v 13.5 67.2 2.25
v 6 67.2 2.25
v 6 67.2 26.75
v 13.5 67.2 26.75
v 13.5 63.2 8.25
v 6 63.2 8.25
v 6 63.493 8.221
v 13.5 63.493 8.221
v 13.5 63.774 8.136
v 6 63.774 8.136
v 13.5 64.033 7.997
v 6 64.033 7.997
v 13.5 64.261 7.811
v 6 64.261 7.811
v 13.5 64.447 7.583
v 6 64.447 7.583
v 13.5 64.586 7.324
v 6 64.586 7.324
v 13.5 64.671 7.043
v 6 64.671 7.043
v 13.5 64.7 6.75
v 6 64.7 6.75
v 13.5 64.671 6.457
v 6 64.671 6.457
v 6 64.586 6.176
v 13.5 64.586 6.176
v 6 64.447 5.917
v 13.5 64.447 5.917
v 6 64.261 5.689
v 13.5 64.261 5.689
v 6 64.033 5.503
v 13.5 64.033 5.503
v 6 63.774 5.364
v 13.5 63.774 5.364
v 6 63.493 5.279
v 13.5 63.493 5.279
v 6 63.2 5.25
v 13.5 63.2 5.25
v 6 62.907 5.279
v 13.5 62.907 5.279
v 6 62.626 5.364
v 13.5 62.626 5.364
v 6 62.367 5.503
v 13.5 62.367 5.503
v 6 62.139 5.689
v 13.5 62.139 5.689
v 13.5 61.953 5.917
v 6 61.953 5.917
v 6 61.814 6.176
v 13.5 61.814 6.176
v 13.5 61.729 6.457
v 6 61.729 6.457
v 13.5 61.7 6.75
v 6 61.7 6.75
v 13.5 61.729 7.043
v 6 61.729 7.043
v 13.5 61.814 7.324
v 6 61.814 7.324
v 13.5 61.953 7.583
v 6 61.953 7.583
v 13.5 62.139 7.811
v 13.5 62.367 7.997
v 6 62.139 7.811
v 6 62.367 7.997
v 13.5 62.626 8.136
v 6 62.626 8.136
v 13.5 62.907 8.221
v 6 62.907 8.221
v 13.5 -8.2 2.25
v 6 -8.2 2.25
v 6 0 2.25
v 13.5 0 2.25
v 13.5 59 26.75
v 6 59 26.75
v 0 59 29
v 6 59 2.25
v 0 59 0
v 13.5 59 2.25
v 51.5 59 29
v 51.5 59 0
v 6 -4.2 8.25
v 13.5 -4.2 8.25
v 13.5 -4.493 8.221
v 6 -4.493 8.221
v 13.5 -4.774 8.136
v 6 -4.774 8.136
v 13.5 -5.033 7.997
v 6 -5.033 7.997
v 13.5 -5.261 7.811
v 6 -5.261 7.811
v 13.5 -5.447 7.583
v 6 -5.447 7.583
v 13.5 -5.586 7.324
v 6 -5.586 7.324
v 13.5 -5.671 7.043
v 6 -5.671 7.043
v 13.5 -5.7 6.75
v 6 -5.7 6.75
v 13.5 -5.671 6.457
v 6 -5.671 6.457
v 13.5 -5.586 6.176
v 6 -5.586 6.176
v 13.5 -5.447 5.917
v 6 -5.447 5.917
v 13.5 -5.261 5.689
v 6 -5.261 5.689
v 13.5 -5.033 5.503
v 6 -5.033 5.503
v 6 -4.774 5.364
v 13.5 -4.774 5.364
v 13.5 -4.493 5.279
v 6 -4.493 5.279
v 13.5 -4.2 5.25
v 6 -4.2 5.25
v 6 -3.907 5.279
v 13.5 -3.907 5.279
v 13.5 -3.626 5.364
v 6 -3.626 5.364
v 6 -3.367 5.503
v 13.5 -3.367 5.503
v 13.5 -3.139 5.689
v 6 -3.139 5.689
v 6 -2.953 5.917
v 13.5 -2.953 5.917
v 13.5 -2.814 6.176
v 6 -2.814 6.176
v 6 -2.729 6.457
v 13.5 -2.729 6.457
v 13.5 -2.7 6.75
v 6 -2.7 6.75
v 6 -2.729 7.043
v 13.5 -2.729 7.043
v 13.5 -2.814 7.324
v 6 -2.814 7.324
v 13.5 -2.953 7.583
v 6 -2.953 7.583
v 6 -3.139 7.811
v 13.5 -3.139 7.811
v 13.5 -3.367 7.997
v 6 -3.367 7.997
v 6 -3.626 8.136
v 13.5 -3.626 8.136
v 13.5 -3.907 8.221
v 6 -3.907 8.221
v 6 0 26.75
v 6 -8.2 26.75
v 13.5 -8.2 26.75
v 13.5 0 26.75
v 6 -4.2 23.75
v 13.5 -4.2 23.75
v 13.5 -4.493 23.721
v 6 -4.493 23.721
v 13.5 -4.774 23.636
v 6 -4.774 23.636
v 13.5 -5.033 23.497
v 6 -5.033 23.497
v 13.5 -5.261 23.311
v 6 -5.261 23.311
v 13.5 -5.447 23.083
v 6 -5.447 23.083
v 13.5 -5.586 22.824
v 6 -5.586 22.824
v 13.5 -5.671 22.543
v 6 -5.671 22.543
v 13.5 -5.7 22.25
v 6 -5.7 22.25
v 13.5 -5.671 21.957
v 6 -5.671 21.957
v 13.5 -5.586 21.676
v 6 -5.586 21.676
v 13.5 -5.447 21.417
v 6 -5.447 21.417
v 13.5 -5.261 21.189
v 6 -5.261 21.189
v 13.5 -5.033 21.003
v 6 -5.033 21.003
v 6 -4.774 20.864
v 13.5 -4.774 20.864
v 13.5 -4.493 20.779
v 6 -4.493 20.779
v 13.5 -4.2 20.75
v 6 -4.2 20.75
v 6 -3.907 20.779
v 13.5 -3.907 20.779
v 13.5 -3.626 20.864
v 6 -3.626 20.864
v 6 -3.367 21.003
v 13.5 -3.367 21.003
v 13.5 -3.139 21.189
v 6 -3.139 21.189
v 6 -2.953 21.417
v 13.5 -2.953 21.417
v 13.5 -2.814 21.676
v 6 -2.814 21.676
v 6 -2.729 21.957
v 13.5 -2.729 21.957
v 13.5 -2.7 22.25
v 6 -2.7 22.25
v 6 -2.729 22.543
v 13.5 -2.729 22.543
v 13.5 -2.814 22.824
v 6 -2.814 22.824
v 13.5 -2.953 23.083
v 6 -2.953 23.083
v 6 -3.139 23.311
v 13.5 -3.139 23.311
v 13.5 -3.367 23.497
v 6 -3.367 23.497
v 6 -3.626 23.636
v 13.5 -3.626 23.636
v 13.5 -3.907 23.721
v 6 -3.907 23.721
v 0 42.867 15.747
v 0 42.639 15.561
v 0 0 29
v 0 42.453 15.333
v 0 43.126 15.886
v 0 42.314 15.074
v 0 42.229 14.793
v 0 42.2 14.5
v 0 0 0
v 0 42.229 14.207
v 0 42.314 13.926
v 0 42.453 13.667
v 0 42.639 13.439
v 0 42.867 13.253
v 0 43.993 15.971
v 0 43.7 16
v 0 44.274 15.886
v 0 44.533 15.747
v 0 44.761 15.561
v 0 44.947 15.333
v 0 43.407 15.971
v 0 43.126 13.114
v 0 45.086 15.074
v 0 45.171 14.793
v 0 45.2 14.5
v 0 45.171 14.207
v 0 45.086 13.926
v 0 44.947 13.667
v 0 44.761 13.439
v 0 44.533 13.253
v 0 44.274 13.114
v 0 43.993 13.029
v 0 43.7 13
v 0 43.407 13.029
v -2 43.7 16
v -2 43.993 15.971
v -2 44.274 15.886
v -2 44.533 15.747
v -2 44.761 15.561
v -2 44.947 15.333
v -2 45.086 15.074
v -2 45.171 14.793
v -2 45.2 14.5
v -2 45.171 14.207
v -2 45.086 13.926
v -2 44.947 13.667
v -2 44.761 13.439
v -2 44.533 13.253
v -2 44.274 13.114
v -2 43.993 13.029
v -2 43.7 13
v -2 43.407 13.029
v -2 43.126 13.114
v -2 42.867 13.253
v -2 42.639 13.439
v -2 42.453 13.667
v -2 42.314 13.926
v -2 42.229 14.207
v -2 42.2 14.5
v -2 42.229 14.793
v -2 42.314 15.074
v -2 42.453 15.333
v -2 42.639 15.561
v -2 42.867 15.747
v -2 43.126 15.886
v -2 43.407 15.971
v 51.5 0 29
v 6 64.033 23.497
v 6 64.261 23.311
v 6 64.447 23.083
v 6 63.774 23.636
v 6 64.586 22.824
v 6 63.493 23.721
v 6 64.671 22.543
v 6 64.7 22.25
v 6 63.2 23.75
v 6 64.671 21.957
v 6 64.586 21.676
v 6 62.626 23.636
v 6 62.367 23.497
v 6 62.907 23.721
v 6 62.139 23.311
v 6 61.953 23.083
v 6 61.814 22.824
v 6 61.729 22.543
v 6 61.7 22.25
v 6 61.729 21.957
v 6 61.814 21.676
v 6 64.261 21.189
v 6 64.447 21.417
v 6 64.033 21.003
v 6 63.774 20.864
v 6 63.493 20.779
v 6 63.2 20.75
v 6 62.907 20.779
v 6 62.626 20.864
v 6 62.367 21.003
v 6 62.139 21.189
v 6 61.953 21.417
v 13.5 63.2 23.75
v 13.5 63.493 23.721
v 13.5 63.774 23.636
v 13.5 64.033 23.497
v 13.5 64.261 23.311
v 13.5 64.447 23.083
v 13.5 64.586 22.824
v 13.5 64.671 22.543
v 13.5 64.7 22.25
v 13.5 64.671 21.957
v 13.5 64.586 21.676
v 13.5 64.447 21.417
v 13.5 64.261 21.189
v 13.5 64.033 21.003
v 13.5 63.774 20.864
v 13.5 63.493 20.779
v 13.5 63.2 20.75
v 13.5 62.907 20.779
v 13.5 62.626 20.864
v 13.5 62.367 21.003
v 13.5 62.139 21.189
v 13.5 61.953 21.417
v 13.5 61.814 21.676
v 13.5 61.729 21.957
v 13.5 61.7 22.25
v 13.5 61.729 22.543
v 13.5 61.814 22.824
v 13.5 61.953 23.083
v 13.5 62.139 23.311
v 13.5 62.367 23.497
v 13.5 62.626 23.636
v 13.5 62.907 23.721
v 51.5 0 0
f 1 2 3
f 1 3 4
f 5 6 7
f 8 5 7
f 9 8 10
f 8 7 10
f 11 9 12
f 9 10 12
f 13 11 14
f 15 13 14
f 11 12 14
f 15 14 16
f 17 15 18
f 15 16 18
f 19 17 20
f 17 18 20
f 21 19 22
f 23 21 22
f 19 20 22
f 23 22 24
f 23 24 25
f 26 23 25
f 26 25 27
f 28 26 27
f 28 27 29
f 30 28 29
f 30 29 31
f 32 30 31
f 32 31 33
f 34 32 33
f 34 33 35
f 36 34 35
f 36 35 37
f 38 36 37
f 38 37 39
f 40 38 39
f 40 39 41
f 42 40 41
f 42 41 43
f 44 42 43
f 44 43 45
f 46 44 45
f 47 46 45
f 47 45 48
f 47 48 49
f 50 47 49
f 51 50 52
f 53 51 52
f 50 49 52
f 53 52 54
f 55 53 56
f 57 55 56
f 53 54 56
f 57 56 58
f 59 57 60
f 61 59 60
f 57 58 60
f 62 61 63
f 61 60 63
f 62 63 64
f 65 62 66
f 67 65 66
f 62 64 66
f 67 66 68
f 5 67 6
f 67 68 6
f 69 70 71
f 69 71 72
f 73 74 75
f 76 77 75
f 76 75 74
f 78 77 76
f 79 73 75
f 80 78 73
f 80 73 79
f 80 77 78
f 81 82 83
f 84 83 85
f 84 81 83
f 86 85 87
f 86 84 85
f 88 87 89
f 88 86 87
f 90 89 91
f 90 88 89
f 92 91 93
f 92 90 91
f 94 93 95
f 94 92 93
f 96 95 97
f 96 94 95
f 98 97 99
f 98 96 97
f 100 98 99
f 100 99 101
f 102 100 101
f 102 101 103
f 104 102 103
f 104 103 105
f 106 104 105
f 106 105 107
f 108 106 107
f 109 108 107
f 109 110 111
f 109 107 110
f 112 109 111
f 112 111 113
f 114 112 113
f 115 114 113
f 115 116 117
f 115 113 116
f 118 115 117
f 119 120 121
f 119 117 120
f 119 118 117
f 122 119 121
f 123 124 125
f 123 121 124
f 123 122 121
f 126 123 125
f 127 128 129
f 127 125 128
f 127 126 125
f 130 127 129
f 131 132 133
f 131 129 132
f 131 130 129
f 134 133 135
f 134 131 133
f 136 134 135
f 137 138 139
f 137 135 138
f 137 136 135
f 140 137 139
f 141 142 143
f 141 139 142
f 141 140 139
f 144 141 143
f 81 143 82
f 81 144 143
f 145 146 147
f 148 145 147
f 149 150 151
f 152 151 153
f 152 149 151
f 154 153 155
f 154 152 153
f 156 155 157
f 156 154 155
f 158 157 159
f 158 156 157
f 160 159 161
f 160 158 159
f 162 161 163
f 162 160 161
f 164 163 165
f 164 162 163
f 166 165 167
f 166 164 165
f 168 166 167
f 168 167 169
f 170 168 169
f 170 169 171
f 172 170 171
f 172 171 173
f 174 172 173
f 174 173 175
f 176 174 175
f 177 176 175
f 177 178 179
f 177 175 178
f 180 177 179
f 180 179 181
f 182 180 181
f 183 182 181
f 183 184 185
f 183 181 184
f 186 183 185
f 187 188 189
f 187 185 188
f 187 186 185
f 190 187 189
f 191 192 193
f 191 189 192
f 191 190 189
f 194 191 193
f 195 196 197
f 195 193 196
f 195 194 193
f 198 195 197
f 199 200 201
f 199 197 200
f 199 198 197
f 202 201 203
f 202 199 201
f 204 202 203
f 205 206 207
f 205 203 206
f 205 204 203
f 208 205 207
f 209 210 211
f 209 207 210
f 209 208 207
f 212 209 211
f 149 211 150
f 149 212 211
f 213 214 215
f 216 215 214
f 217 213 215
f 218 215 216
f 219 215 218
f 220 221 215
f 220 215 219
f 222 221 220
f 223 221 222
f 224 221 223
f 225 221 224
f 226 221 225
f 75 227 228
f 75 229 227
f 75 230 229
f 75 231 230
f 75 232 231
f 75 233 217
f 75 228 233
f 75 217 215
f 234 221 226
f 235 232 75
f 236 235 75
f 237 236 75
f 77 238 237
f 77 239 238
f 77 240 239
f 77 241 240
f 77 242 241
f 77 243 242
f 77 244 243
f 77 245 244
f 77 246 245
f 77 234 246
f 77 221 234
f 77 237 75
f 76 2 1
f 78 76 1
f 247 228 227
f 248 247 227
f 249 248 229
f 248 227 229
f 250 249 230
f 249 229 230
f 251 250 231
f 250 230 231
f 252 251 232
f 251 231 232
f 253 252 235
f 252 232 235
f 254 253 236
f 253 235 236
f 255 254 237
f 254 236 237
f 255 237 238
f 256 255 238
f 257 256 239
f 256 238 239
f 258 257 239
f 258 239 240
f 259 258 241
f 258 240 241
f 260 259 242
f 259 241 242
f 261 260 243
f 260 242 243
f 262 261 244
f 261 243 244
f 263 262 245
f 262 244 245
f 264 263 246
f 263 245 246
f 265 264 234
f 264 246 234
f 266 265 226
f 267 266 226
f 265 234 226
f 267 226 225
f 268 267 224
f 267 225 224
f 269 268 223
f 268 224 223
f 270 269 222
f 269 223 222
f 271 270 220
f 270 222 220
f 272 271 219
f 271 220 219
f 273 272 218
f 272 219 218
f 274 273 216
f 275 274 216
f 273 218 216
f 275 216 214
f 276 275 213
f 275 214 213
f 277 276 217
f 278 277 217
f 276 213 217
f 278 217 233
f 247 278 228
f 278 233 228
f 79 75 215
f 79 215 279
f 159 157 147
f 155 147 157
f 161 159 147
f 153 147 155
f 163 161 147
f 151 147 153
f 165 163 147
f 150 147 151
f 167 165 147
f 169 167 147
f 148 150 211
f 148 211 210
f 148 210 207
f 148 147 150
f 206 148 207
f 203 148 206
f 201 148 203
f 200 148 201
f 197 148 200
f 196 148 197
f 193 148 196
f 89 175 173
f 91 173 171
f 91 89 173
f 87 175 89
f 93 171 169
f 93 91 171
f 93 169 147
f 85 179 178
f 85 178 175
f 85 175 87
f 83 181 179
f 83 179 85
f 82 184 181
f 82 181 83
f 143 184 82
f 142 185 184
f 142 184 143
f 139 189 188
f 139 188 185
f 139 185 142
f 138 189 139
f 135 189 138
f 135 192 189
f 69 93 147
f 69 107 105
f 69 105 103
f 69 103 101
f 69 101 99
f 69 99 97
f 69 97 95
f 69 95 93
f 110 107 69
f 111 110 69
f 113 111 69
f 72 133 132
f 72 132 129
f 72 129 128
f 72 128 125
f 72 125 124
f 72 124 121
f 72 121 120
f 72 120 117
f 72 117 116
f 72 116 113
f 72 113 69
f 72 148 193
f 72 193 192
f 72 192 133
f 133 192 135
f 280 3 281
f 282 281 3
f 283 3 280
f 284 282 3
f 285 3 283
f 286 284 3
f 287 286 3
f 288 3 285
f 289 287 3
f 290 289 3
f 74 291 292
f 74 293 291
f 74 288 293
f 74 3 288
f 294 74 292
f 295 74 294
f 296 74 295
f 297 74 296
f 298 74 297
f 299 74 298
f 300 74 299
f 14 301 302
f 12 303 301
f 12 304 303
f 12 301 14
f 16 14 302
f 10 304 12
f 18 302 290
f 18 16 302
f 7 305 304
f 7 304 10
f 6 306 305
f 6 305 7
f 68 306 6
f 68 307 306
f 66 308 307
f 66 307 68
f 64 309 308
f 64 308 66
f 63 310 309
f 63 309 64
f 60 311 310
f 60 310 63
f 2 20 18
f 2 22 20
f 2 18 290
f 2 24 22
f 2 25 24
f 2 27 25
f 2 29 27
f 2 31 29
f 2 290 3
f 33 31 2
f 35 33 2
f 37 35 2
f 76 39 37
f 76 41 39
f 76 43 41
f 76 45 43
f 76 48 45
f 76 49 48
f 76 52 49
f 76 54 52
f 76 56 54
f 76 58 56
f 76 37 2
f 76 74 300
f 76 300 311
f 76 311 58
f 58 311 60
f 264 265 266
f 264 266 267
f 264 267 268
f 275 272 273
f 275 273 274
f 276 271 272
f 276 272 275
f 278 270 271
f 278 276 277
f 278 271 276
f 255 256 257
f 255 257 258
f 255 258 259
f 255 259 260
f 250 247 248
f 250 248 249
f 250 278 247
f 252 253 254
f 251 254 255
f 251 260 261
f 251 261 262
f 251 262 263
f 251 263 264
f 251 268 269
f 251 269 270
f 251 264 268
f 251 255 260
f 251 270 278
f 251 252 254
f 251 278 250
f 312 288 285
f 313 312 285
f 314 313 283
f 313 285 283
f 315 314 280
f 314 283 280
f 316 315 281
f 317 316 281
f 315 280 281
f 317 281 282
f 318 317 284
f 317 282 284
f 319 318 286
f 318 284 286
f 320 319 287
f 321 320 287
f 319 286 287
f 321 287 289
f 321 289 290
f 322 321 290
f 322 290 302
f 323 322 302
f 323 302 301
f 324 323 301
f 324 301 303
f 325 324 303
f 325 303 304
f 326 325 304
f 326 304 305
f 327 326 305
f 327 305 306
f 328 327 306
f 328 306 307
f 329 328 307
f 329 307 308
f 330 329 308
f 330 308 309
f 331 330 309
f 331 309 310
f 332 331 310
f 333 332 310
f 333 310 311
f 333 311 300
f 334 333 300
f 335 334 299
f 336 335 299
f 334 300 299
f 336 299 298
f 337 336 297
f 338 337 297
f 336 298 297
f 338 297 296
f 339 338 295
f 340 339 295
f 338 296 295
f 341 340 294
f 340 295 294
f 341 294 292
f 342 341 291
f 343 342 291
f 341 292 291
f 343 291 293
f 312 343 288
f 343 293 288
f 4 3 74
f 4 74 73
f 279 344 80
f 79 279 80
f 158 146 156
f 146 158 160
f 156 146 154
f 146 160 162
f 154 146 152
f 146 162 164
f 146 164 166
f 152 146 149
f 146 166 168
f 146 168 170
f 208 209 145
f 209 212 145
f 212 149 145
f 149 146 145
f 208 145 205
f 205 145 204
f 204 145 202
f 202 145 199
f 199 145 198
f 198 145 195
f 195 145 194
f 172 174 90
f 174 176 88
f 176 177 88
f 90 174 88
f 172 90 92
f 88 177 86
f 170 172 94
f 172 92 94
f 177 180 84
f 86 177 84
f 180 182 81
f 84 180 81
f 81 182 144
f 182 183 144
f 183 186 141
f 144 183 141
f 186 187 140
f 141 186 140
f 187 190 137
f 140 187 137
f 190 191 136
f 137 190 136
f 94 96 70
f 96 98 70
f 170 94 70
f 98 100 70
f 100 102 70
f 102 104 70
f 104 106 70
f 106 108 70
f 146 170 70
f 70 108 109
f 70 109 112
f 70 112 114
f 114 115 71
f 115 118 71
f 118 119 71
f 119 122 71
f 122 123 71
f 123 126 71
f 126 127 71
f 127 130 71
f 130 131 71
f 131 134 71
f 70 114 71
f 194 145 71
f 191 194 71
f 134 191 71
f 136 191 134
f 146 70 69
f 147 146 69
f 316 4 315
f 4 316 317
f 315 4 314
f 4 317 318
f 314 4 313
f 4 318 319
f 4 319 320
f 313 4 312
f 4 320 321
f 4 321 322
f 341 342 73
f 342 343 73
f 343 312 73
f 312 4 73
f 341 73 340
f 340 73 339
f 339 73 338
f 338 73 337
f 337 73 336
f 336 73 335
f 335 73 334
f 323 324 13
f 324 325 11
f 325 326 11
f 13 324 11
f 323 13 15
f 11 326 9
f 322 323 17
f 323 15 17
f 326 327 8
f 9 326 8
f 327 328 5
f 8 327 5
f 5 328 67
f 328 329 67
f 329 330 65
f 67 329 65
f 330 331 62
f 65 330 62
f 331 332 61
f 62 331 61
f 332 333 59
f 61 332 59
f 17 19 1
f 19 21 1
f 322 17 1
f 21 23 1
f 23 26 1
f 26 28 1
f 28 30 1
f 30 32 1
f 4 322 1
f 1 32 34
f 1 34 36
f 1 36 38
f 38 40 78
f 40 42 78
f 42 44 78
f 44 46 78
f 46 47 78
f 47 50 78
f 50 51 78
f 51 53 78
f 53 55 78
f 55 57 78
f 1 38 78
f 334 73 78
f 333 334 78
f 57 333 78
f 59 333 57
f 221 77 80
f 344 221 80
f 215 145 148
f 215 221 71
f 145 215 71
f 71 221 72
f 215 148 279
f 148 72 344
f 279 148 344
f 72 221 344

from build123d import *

# Parameters (mm, degrees)
SKETCH1_W           = 51.5
SKETCH1_H           = 59
BOSS_EXTRUDE1_DEPTH = 29
SKETCH2_W           = 7.5
SKETCH2_H           = 24.5
BOSS_EXTRUDE3_DEPTH = 8.2
SKETCH7_R           = 1.5
CUT_EXTRUDE1_DEPTH  = 8.2
SKETCH8_R           = 1.5
BOSS_EXTRUDE4_DEPTH = 2


with BuildPart() as part:
    # Sketch1 → Boss-Extrude1 (new body)
    with BuildSketch(Plane.XY):
        with Locations((25.75, 29.5)):
            Rectangle(SKETCH1_W, SKETCH1_H)
    extrude(amount=BOSS_EXTRUDE1_DEPTH)

    # Sketch2 → Boss-Extrude3 (add)
    with BuildSketch(Plane(origin=(0, 59, 0), x_dir=(1, 0, 0), z_dir=(0, 1, 0))):
        with Locations((9.75, -14.5)):
            Rectangle(SKETCH2_W, SKETCH2_H)
    boss_extrude3 = extrude(amount=BOSS_EXTRUDE3_DEPTH)

    # Sketch7 → Cut-Extrude1 (cut)
    with BuildSketch(Plane.ZY.offset(-6)):
        with Locations((6.75, 63.2)):
            Circle(SKETCH7_R)
        with Locations((22.25, 63.2)):
            Circle(SKETCH7_R)
    cut_extrude1 = extrude(amount=-CUT_EXTRUDE1_DEPTH, mode=Mode.SUBTRACT)

    # Mirror3: Boss-Extrude3, Cut-Extrude1 across plane
    add(boss_extrude3.mirror(Plane.ZX.offset(29.5)))
    add(cut_extrude1.mirror(Plane.ZX.offset(29.5)), mode=Mode.SUBTRACT)

    # Sketch8 → Boss-Extrude4 (add)
    with BuildSketch(Plane.ZY):
        with Locations((14.5, 43.7)):
            Circle(SKETCH8_R)
    extrude(amount=BOSS_EXTRUDE4_DEPTH)


solid = part.part
